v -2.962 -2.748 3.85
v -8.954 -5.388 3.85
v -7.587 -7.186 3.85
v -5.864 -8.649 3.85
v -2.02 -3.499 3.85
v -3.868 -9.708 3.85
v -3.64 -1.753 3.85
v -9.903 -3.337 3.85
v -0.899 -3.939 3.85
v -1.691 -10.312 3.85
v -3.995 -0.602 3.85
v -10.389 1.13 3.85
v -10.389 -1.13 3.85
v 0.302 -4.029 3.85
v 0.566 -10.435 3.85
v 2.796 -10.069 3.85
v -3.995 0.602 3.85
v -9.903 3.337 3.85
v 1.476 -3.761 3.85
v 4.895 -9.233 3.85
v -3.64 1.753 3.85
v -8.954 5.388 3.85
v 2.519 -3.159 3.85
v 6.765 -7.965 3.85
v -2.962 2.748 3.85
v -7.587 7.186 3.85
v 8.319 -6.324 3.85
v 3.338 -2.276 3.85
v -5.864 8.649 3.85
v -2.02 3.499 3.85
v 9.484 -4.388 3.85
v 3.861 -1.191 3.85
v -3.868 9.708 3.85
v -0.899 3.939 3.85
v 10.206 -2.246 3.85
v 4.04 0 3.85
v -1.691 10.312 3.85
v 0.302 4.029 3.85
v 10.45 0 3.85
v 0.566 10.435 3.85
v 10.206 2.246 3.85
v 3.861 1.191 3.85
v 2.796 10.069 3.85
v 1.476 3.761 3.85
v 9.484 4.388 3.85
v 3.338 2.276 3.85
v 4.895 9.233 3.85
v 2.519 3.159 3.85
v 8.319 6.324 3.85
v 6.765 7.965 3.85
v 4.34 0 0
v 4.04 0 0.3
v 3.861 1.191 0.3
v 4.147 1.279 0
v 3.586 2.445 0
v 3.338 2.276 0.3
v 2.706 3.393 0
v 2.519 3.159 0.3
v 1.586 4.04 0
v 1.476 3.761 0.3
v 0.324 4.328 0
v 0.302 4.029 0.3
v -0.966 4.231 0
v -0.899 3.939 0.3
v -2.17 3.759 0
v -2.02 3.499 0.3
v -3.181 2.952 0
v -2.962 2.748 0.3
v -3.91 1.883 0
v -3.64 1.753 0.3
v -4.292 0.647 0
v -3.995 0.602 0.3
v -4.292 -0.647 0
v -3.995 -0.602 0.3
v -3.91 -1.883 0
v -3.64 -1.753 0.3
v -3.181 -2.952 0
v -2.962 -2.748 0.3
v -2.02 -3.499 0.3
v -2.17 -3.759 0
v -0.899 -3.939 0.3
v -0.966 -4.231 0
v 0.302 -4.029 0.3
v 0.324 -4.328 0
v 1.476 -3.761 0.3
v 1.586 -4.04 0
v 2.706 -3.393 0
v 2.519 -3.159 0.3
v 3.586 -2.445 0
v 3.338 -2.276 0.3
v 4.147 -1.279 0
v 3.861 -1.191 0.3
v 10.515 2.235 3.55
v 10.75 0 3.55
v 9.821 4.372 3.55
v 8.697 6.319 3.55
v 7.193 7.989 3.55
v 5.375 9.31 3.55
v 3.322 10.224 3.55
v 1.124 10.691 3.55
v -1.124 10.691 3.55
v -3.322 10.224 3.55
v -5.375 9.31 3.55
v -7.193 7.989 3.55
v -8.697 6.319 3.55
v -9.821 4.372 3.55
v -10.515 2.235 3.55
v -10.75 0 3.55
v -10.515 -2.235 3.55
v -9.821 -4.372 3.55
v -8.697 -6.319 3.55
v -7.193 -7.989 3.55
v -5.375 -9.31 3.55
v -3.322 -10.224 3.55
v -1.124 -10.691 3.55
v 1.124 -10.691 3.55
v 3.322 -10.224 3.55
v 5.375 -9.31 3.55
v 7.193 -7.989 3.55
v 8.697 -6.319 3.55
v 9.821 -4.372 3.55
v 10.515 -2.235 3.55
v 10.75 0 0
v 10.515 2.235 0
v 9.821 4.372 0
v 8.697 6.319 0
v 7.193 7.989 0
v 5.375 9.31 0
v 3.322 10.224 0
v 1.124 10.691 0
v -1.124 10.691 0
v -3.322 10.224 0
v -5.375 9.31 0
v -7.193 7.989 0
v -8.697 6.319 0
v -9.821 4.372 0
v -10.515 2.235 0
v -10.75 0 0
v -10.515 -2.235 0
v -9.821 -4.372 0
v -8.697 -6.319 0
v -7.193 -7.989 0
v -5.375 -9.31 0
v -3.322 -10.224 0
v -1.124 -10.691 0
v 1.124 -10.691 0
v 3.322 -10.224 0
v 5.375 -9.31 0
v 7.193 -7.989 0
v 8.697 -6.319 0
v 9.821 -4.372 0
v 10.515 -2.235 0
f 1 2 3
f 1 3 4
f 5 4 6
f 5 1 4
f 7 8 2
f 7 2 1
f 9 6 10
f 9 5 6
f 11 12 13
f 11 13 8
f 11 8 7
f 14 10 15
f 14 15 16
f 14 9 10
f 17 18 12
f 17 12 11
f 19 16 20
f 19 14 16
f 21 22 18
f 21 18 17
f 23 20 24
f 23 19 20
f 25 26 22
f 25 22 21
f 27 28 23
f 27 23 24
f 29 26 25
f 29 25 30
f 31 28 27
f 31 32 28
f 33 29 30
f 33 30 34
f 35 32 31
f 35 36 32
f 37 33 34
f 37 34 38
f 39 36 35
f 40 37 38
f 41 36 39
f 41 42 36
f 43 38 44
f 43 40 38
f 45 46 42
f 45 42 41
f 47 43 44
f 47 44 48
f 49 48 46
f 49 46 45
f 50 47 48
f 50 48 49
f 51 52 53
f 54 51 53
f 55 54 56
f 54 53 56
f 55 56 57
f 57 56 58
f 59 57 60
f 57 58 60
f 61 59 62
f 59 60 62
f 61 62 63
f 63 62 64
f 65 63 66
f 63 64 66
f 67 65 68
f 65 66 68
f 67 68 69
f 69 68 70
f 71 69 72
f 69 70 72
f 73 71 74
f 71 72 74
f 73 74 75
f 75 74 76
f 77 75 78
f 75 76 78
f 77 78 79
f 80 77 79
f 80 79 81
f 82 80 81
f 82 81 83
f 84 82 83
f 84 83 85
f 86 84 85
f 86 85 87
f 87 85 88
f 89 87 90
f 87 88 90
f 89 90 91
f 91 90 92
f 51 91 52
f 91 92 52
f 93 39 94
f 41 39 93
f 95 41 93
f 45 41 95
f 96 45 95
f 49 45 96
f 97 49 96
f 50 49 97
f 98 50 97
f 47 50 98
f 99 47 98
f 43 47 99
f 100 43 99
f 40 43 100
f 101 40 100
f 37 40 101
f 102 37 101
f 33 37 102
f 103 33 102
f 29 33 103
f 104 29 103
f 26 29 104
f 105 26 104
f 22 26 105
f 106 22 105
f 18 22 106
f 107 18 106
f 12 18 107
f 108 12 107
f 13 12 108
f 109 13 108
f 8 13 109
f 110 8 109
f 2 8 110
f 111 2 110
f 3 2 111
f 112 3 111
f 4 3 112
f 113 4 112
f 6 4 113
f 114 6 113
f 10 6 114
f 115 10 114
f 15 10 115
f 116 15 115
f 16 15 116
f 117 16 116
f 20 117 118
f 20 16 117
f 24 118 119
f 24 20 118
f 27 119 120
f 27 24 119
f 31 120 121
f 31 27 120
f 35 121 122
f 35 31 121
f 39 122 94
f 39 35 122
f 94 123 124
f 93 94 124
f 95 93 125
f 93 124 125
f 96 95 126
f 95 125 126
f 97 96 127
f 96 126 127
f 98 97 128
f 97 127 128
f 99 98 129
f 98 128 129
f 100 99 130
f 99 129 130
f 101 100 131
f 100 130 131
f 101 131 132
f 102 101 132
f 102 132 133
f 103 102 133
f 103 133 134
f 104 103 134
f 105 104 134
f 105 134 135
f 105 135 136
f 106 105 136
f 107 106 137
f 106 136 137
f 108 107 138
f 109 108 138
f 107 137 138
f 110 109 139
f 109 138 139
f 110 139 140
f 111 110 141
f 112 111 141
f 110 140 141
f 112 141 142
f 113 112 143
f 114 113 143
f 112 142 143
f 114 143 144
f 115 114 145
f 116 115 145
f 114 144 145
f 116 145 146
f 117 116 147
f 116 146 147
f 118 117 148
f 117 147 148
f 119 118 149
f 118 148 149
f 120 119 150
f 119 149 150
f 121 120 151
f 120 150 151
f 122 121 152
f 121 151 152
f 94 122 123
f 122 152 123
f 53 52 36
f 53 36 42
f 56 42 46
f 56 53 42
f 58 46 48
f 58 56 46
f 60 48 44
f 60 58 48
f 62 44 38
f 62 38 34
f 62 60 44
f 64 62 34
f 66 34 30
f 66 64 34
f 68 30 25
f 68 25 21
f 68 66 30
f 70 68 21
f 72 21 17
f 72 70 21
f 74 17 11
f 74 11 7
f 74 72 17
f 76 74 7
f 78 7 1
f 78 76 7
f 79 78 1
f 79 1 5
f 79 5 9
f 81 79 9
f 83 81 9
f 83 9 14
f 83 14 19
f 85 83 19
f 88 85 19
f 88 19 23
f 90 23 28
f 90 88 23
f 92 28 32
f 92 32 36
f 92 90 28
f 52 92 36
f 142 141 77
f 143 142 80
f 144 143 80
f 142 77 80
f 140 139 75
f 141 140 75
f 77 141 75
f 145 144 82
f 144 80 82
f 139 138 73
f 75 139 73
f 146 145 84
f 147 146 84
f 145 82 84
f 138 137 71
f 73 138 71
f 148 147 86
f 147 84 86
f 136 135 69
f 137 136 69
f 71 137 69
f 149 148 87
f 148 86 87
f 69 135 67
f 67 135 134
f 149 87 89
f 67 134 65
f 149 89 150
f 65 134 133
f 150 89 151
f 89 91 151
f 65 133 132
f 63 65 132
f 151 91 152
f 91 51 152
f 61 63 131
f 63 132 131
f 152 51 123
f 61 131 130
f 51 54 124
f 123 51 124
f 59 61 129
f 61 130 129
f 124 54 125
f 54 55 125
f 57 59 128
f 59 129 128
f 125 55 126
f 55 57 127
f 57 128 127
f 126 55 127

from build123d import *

# Parameters (mm, degrees)
SKETCH_1_R      = 10.75
SKETCH_1_R_2    = 4.04
EXTRUDE_1_DEPTH = 3.85
CHAMFER_1_SIZE  = 0.3
CHAMFER_2_SIZE  = 0.3


with BuildPart() as part:
    # 草图1 → 凸台-拉伸1 (new body)
    with BuildSketch(Plane.XY):
        Circle(SKETCH_1_R)
        Circle(SKETCH_1_R_2, mode=Mode.SUBTRACT)
    extrude(amount=EXTRUDE_1_DEPTH)

    # 倒角1
    chamfer_1_edges = [part.edges().sort_by_distance(p)[0] for p in [
        (-10.75, 0, 3.85),
    ]]
    chamfer(chamfer_1_edges, length=CHAMFER_1_SIZE)

    # 倒角2
    chamfer_2_edges = [part.edges().sort_by_distance(p)[0] for p in [
        (-4.04, 0, 0),
    ]]
    chamfer(chamfer_2_edges, length=CHAMFER_2_SIZE)


solid = part.part
